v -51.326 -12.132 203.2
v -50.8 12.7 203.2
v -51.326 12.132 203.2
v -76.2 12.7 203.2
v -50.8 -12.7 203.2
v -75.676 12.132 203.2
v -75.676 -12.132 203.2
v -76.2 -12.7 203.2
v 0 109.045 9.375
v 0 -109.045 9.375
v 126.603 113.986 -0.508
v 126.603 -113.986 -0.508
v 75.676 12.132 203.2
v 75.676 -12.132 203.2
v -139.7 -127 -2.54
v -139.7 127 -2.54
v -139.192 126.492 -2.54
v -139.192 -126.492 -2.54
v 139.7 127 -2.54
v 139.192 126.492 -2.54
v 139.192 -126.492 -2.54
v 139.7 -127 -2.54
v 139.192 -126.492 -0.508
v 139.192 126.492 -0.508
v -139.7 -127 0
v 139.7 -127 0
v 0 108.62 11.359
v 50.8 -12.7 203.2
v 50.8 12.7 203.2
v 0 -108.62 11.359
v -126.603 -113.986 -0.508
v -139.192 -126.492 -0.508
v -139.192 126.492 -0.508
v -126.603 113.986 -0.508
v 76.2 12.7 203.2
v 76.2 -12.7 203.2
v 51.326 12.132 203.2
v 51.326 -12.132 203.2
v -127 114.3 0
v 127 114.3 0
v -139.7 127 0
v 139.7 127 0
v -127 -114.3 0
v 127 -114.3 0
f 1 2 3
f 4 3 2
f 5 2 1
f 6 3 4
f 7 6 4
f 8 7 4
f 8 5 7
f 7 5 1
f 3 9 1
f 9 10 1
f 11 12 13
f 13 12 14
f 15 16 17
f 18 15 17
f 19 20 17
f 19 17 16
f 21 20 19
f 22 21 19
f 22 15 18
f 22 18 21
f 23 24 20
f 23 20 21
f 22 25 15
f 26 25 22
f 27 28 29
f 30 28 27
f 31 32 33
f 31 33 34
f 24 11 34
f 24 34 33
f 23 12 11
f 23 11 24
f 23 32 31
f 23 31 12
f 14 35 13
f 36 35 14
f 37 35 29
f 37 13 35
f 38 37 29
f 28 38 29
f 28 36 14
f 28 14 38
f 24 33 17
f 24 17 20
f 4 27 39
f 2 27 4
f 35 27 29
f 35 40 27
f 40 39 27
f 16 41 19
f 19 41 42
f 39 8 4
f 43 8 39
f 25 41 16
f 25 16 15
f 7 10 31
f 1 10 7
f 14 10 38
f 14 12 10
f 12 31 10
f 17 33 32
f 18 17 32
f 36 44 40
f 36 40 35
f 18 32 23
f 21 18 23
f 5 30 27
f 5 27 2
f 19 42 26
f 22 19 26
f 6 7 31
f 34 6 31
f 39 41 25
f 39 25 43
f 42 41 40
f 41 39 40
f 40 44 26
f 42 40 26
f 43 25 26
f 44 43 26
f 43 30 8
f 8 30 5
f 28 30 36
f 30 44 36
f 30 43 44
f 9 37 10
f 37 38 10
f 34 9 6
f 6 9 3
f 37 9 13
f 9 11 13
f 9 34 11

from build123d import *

# Parameters (mm, degrees)
F6_DEPTH      = 114.3
F6_DEPTH_BACK = 114.3
F8_DEPTH      = 127.001
F8_DEPTH_BACK = 127.001
F9_W          = 279.4
F9_H          = 254
F10_DEPTH     = 2.54
F11_T         = -0.508


# Not quite as in the source:
# - a pattern or mirror of a feature is missing from the dataset's text; its kind, count and spacing are read off the source's solid


with BuildPart() as f6:
    # F5 (on Front) → F6 (new body, two sides)
    with BuildSketch(Plane.XZ) as f6_sk:
        Polygon((-76.2, 203.2), (-127, 0), (127, 0), (76.2, 203.2), (50.8, 203.2), (0, 11.3592253257), (-50.8, 203.2), align=None)
    extrude(amount=F6_DEPTH)
    extrude(f6_sk.sketch, amount=-F6_DEPTH_BACK)

    # F7 (on Right) → F8 (cut, two sides)
    with BuildSketch(Plane.YZ) as f8_sk:
        Polygon((-114.3, 203.2), (-114.3, 0), (-12.7, 203.2), align=None)
    f8 = extrude(amount=-F8_DEPTH, mode=Mode.SUBTRACT) + extrude(f8_sk.sketch, amount=F8_DEPTH_BACK, mode=Mode.SUBTRACT)

    # F8_copies: F8 across plane
    add(f8.mirror(Plane.ZX), mode=Mode.SUBTRACT)

    # F9 (on face) → F10 (join)
    with BuildSketch(Plane(origin=(0, 0, 0), x_dir=(1, 0, 0), z_dir=(0, 0, -1))):
        Rectangle(F9_W, F9_H)
    extrude(amount=F10_DEPTH)

    # F11
    f11_openings = [f6.faces().sort_by_distance(p)[0] for p in [
        (0, 0, -2.54),
        (63.5, 0, 203.2),
        (-63.5, 0, 203.2),
    ]]
    offset(amount=F11_T, openings=f11_openings, kind=Kind.INTERSECTION)


solid = f6.part
